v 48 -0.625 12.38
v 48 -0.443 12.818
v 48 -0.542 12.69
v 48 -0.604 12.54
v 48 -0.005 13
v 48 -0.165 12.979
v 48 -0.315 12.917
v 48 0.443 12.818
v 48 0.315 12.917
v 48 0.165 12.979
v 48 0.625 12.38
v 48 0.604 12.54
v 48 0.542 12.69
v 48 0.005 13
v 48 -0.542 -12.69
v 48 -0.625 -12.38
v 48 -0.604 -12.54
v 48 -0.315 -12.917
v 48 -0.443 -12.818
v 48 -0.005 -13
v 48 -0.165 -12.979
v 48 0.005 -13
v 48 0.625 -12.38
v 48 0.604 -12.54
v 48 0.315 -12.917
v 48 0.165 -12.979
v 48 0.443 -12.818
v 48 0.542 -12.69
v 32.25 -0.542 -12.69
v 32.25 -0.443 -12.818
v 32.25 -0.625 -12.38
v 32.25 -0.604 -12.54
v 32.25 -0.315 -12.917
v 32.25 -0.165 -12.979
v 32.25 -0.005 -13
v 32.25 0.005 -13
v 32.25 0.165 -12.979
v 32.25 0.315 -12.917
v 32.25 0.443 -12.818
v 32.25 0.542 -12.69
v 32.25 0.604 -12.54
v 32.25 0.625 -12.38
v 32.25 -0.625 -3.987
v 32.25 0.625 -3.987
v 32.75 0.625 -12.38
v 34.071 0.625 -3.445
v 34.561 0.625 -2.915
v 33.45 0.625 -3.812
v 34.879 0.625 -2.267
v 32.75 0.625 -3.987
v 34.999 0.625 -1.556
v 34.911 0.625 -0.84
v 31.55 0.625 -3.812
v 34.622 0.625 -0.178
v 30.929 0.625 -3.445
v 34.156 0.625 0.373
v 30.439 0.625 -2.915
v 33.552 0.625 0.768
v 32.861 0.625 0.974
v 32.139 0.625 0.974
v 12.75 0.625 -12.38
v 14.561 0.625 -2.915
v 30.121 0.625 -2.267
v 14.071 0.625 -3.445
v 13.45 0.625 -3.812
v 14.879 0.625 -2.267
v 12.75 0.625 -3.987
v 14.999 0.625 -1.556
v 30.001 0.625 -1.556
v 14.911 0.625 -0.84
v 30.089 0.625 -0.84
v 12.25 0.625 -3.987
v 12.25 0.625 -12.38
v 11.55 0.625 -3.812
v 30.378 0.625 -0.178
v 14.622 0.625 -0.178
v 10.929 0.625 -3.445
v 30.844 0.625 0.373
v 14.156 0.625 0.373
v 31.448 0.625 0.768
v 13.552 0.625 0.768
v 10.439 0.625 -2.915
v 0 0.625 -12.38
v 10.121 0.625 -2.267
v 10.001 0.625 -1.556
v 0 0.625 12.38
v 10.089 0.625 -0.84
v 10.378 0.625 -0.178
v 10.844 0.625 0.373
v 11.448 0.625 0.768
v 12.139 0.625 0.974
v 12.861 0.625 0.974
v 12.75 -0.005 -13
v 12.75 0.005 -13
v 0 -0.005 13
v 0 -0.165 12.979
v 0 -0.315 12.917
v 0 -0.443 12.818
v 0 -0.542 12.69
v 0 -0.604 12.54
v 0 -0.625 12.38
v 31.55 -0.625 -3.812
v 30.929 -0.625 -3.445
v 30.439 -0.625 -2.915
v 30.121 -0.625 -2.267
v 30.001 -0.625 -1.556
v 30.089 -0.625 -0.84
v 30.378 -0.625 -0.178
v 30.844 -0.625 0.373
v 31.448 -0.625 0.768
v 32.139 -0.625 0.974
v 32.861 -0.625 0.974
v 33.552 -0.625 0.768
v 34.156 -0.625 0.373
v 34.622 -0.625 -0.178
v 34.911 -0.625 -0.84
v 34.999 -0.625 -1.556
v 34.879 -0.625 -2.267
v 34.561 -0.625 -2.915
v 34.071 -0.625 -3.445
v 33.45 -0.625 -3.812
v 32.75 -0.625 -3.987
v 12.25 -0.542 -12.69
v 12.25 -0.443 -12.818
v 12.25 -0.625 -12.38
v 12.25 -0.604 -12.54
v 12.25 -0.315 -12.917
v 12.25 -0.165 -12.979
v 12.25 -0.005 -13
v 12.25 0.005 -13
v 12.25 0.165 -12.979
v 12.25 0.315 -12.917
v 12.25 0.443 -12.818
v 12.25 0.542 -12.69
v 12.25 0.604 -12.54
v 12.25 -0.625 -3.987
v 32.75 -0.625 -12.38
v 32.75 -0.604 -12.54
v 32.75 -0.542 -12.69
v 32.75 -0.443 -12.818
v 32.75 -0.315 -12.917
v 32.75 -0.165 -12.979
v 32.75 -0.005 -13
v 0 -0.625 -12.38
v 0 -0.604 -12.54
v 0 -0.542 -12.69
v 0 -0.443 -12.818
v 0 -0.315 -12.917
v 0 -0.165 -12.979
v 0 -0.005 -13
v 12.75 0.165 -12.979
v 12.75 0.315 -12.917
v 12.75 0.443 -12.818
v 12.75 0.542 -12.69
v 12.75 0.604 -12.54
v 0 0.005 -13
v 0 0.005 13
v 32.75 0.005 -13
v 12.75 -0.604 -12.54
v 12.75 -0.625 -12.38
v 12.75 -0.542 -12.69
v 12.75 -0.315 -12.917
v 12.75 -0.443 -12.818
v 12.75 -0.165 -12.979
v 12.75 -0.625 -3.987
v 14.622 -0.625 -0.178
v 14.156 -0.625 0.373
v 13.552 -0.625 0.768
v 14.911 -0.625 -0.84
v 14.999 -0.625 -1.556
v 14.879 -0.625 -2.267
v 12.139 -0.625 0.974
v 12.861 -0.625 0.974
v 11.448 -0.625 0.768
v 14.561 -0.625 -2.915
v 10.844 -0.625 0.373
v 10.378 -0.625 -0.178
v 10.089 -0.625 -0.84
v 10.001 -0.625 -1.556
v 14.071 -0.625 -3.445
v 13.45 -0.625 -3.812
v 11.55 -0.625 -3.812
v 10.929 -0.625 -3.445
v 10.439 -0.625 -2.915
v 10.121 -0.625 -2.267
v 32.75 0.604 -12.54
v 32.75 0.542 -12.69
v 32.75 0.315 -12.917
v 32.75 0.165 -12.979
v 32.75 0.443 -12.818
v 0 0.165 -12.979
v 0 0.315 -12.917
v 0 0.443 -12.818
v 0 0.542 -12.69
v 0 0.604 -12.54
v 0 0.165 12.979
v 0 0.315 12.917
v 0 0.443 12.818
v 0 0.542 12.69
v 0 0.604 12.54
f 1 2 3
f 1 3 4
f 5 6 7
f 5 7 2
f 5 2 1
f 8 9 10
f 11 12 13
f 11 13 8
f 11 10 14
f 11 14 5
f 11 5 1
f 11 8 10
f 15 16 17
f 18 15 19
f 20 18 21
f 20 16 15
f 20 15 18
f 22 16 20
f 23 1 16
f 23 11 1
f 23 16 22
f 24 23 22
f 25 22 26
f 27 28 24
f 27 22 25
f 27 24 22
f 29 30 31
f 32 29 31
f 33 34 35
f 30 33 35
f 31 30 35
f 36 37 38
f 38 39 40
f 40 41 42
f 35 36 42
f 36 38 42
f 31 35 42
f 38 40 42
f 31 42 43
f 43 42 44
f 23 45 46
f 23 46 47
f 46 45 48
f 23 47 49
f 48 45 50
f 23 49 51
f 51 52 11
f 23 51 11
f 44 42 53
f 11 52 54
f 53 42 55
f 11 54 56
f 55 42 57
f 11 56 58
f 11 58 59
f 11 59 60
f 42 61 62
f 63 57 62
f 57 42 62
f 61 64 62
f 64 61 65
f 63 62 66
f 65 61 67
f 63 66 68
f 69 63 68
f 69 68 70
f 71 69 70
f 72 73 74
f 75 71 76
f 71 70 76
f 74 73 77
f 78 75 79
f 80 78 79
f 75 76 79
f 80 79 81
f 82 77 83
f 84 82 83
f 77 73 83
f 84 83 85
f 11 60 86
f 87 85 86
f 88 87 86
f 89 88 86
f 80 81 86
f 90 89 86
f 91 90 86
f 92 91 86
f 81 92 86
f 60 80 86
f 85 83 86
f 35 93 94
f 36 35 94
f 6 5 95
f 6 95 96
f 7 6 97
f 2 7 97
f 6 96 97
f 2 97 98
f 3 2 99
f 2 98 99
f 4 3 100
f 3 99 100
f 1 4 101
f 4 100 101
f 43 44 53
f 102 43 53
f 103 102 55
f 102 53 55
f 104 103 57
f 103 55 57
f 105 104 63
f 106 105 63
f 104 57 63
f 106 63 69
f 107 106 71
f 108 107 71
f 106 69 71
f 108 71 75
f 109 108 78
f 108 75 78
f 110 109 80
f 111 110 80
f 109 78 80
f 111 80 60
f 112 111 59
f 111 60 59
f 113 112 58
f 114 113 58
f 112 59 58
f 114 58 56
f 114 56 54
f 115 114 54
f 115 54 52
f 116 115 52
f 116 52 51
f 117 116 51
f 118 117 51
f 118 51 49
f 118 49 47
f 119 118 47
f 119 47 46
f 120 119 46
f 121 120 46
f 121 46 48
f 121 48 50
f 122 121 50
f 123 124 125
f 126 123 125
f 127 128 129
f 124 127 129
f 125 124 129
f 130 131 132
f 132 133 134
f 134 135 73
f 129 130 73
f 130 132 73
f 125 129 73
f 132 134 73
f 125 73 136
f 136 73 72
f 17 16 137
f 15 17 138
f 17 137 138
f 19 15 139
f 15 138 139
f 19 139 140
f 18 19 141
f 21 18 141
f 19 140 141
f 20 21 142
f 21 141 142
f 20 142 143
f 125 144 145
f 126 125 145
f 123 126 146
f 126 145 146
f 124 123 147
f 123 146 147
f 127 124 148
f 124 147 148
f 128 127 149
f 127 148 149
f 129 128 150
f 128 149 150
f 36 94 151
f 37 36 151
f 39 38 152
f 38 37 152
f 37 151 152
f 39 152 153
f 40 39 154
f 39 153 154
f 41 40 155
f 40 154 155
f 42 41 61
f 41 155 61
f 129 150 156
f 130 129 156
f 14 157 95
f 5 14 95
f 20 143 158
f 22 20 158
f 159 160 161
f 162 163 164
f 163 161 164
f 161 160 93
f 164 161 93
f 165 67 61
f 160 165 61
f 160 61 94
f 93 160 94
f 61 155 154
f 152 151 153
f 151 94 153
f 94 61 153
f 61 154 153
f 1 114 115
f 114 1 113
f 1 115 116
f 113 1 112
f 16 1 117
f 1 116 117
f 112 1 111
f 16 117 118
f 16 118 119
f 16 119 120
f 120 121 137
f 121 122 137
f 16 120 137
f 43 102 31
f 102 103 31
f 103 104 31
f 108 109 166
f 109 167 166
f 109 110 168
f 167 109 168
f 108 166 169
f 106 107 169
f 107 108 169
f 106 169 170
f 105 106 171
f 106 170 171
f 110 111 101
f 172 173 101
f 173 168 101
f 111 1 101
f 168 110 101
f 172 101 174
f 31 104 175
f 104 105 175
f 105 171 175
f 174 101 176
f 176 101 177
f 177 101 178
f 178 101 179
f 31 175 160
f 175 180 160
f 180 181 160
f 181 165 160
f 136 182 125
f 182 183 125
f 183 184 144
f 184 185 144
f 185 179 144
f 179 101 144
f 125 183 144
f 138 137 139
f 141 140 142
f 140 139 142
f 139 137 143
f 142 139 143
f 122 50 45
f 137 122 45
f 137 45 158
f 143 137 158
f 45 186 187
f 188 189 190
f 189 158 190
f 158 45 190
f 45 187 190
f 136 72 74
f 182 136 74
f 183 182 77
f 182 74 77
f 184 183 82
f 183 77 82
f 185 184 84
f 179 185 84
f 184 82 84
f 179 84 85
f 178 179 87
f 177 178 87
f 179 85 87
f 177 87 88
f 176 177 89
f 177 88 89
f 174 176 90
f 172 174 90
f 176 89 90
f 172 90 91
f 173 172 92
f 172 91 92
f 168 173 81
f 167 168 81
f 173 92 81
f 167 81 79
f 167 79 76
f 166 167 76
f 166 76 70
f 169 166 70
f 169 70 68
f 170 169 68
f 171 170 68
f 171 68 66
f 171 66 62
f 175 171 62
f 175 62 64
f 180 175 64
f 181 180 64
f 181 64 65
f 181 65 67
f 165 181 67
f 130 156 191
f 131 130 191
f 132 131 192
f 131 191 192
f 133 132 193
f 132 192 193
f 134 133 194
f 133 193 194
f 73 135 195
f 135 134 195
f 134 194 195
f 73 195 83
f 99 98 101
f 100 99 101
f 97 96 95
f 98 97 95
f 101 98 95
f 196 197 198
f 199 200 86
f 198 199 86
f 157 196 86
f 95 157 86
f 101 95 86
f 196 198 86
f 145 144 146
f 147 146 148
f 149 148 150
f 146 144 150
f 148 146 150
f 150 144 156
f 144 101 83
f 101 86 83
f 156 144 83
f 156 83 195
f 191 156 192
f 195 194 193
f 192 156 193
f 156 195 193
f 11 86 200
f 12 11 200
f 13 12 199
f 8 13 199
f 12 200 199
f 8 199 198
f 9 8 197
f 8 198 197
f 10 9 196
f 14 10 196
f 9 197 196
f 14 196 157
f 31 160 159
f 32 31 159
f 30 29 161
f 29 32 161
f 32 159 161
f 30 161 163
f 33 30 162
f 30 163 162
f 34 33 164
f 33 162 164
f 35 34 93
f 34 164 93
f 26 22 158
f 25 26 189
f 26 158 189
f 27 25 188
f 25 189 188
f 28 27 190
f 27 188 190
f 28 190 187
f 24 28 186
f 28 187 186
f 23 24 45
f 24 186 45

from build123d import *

# Parameters (mm, degrees)
BOSS_EXTRUDE1_DEPTH = 48
SKETCH2_W           = 0.5
SKETCH2_H           = 4.044844813
CUT_EXTRUDE1_DEPTH  = 2.25


with BuildPart() as part:
    # Sketch1 → Boss-Extrude1 (new body)
    with BuildSketch(Plane(origin=(0, 0, 0), x_dir=(0, 0, -1), z_dir=(1, 0, 0))):
        with BuildLine():
            Line((12.38, 0.625), (-12.38, 0.625))
            ThreePointArc((-12.38, 0.625), (-12.818406204, 0.443406204), (-13, 0.005))
            Line((-13, 0.005), (-13, -0.005))
            ThreePointArc((-13, -0.005), (-12.818406204, -0.443406204), (-12.38, -0.625))
            Line((-12.38, -0.625), (12.38, -0.625))
            ThreePointArc((12.38, -0.625), (12.818406204, -0.443406204), (13, -0.005))
            Line((13, -0.005), (13, 0.005))
            ThreePointArc((13, 0.005), (12.818406204, 0.443406204), (12.38, 0.625))
        make_face()
    extrude(amount=BOSS_EXTRUDE1_DEPTH)

    # Sketch2 → Cut-Extrude1 (cut, through all)
    with BuildSketch(Plane(origin=(0, 0.625, 0), x_dir=(1, 0, 0), z_dir=(0, 1, 0))):
        with BuildLine():
            ThreePointArc((12.25, 3.987468593), (12.5, -1), (12.75, 3.987468593))
            Line((12.75, 3.987468593), (12.75, 12.38))
            Line((12.75, 12.38), (12.25, 12.38))
            Line((12.25, 12.38), (12.25, 3.987468593))
        make_face()
        with BuildLine():
            Line((32.75, 12.38), (32.25, 12.38))
            Line((32.25, 12.38), (32.25, 3.987468593))
            ThreePointArc((32.25, 3.987468593), (32.5, -1), (32.75, 3.987468593))
            Line((32.75, 3.987468593), (32.75, 12.38))
        make_face()
        with Locations((12.5, 14.402422407)):
            Rectangle(SKETCH2_W, SKETCH2_H)
        with Locations((32.5, 14.402422407)):
            Rectangle(SKETCH2_W, SKETCH2_H)
    extrude(amount=-CUT_EXTRUDE1_DEPTH, mode=Mode.SUBTRACT)


solid = part.part
